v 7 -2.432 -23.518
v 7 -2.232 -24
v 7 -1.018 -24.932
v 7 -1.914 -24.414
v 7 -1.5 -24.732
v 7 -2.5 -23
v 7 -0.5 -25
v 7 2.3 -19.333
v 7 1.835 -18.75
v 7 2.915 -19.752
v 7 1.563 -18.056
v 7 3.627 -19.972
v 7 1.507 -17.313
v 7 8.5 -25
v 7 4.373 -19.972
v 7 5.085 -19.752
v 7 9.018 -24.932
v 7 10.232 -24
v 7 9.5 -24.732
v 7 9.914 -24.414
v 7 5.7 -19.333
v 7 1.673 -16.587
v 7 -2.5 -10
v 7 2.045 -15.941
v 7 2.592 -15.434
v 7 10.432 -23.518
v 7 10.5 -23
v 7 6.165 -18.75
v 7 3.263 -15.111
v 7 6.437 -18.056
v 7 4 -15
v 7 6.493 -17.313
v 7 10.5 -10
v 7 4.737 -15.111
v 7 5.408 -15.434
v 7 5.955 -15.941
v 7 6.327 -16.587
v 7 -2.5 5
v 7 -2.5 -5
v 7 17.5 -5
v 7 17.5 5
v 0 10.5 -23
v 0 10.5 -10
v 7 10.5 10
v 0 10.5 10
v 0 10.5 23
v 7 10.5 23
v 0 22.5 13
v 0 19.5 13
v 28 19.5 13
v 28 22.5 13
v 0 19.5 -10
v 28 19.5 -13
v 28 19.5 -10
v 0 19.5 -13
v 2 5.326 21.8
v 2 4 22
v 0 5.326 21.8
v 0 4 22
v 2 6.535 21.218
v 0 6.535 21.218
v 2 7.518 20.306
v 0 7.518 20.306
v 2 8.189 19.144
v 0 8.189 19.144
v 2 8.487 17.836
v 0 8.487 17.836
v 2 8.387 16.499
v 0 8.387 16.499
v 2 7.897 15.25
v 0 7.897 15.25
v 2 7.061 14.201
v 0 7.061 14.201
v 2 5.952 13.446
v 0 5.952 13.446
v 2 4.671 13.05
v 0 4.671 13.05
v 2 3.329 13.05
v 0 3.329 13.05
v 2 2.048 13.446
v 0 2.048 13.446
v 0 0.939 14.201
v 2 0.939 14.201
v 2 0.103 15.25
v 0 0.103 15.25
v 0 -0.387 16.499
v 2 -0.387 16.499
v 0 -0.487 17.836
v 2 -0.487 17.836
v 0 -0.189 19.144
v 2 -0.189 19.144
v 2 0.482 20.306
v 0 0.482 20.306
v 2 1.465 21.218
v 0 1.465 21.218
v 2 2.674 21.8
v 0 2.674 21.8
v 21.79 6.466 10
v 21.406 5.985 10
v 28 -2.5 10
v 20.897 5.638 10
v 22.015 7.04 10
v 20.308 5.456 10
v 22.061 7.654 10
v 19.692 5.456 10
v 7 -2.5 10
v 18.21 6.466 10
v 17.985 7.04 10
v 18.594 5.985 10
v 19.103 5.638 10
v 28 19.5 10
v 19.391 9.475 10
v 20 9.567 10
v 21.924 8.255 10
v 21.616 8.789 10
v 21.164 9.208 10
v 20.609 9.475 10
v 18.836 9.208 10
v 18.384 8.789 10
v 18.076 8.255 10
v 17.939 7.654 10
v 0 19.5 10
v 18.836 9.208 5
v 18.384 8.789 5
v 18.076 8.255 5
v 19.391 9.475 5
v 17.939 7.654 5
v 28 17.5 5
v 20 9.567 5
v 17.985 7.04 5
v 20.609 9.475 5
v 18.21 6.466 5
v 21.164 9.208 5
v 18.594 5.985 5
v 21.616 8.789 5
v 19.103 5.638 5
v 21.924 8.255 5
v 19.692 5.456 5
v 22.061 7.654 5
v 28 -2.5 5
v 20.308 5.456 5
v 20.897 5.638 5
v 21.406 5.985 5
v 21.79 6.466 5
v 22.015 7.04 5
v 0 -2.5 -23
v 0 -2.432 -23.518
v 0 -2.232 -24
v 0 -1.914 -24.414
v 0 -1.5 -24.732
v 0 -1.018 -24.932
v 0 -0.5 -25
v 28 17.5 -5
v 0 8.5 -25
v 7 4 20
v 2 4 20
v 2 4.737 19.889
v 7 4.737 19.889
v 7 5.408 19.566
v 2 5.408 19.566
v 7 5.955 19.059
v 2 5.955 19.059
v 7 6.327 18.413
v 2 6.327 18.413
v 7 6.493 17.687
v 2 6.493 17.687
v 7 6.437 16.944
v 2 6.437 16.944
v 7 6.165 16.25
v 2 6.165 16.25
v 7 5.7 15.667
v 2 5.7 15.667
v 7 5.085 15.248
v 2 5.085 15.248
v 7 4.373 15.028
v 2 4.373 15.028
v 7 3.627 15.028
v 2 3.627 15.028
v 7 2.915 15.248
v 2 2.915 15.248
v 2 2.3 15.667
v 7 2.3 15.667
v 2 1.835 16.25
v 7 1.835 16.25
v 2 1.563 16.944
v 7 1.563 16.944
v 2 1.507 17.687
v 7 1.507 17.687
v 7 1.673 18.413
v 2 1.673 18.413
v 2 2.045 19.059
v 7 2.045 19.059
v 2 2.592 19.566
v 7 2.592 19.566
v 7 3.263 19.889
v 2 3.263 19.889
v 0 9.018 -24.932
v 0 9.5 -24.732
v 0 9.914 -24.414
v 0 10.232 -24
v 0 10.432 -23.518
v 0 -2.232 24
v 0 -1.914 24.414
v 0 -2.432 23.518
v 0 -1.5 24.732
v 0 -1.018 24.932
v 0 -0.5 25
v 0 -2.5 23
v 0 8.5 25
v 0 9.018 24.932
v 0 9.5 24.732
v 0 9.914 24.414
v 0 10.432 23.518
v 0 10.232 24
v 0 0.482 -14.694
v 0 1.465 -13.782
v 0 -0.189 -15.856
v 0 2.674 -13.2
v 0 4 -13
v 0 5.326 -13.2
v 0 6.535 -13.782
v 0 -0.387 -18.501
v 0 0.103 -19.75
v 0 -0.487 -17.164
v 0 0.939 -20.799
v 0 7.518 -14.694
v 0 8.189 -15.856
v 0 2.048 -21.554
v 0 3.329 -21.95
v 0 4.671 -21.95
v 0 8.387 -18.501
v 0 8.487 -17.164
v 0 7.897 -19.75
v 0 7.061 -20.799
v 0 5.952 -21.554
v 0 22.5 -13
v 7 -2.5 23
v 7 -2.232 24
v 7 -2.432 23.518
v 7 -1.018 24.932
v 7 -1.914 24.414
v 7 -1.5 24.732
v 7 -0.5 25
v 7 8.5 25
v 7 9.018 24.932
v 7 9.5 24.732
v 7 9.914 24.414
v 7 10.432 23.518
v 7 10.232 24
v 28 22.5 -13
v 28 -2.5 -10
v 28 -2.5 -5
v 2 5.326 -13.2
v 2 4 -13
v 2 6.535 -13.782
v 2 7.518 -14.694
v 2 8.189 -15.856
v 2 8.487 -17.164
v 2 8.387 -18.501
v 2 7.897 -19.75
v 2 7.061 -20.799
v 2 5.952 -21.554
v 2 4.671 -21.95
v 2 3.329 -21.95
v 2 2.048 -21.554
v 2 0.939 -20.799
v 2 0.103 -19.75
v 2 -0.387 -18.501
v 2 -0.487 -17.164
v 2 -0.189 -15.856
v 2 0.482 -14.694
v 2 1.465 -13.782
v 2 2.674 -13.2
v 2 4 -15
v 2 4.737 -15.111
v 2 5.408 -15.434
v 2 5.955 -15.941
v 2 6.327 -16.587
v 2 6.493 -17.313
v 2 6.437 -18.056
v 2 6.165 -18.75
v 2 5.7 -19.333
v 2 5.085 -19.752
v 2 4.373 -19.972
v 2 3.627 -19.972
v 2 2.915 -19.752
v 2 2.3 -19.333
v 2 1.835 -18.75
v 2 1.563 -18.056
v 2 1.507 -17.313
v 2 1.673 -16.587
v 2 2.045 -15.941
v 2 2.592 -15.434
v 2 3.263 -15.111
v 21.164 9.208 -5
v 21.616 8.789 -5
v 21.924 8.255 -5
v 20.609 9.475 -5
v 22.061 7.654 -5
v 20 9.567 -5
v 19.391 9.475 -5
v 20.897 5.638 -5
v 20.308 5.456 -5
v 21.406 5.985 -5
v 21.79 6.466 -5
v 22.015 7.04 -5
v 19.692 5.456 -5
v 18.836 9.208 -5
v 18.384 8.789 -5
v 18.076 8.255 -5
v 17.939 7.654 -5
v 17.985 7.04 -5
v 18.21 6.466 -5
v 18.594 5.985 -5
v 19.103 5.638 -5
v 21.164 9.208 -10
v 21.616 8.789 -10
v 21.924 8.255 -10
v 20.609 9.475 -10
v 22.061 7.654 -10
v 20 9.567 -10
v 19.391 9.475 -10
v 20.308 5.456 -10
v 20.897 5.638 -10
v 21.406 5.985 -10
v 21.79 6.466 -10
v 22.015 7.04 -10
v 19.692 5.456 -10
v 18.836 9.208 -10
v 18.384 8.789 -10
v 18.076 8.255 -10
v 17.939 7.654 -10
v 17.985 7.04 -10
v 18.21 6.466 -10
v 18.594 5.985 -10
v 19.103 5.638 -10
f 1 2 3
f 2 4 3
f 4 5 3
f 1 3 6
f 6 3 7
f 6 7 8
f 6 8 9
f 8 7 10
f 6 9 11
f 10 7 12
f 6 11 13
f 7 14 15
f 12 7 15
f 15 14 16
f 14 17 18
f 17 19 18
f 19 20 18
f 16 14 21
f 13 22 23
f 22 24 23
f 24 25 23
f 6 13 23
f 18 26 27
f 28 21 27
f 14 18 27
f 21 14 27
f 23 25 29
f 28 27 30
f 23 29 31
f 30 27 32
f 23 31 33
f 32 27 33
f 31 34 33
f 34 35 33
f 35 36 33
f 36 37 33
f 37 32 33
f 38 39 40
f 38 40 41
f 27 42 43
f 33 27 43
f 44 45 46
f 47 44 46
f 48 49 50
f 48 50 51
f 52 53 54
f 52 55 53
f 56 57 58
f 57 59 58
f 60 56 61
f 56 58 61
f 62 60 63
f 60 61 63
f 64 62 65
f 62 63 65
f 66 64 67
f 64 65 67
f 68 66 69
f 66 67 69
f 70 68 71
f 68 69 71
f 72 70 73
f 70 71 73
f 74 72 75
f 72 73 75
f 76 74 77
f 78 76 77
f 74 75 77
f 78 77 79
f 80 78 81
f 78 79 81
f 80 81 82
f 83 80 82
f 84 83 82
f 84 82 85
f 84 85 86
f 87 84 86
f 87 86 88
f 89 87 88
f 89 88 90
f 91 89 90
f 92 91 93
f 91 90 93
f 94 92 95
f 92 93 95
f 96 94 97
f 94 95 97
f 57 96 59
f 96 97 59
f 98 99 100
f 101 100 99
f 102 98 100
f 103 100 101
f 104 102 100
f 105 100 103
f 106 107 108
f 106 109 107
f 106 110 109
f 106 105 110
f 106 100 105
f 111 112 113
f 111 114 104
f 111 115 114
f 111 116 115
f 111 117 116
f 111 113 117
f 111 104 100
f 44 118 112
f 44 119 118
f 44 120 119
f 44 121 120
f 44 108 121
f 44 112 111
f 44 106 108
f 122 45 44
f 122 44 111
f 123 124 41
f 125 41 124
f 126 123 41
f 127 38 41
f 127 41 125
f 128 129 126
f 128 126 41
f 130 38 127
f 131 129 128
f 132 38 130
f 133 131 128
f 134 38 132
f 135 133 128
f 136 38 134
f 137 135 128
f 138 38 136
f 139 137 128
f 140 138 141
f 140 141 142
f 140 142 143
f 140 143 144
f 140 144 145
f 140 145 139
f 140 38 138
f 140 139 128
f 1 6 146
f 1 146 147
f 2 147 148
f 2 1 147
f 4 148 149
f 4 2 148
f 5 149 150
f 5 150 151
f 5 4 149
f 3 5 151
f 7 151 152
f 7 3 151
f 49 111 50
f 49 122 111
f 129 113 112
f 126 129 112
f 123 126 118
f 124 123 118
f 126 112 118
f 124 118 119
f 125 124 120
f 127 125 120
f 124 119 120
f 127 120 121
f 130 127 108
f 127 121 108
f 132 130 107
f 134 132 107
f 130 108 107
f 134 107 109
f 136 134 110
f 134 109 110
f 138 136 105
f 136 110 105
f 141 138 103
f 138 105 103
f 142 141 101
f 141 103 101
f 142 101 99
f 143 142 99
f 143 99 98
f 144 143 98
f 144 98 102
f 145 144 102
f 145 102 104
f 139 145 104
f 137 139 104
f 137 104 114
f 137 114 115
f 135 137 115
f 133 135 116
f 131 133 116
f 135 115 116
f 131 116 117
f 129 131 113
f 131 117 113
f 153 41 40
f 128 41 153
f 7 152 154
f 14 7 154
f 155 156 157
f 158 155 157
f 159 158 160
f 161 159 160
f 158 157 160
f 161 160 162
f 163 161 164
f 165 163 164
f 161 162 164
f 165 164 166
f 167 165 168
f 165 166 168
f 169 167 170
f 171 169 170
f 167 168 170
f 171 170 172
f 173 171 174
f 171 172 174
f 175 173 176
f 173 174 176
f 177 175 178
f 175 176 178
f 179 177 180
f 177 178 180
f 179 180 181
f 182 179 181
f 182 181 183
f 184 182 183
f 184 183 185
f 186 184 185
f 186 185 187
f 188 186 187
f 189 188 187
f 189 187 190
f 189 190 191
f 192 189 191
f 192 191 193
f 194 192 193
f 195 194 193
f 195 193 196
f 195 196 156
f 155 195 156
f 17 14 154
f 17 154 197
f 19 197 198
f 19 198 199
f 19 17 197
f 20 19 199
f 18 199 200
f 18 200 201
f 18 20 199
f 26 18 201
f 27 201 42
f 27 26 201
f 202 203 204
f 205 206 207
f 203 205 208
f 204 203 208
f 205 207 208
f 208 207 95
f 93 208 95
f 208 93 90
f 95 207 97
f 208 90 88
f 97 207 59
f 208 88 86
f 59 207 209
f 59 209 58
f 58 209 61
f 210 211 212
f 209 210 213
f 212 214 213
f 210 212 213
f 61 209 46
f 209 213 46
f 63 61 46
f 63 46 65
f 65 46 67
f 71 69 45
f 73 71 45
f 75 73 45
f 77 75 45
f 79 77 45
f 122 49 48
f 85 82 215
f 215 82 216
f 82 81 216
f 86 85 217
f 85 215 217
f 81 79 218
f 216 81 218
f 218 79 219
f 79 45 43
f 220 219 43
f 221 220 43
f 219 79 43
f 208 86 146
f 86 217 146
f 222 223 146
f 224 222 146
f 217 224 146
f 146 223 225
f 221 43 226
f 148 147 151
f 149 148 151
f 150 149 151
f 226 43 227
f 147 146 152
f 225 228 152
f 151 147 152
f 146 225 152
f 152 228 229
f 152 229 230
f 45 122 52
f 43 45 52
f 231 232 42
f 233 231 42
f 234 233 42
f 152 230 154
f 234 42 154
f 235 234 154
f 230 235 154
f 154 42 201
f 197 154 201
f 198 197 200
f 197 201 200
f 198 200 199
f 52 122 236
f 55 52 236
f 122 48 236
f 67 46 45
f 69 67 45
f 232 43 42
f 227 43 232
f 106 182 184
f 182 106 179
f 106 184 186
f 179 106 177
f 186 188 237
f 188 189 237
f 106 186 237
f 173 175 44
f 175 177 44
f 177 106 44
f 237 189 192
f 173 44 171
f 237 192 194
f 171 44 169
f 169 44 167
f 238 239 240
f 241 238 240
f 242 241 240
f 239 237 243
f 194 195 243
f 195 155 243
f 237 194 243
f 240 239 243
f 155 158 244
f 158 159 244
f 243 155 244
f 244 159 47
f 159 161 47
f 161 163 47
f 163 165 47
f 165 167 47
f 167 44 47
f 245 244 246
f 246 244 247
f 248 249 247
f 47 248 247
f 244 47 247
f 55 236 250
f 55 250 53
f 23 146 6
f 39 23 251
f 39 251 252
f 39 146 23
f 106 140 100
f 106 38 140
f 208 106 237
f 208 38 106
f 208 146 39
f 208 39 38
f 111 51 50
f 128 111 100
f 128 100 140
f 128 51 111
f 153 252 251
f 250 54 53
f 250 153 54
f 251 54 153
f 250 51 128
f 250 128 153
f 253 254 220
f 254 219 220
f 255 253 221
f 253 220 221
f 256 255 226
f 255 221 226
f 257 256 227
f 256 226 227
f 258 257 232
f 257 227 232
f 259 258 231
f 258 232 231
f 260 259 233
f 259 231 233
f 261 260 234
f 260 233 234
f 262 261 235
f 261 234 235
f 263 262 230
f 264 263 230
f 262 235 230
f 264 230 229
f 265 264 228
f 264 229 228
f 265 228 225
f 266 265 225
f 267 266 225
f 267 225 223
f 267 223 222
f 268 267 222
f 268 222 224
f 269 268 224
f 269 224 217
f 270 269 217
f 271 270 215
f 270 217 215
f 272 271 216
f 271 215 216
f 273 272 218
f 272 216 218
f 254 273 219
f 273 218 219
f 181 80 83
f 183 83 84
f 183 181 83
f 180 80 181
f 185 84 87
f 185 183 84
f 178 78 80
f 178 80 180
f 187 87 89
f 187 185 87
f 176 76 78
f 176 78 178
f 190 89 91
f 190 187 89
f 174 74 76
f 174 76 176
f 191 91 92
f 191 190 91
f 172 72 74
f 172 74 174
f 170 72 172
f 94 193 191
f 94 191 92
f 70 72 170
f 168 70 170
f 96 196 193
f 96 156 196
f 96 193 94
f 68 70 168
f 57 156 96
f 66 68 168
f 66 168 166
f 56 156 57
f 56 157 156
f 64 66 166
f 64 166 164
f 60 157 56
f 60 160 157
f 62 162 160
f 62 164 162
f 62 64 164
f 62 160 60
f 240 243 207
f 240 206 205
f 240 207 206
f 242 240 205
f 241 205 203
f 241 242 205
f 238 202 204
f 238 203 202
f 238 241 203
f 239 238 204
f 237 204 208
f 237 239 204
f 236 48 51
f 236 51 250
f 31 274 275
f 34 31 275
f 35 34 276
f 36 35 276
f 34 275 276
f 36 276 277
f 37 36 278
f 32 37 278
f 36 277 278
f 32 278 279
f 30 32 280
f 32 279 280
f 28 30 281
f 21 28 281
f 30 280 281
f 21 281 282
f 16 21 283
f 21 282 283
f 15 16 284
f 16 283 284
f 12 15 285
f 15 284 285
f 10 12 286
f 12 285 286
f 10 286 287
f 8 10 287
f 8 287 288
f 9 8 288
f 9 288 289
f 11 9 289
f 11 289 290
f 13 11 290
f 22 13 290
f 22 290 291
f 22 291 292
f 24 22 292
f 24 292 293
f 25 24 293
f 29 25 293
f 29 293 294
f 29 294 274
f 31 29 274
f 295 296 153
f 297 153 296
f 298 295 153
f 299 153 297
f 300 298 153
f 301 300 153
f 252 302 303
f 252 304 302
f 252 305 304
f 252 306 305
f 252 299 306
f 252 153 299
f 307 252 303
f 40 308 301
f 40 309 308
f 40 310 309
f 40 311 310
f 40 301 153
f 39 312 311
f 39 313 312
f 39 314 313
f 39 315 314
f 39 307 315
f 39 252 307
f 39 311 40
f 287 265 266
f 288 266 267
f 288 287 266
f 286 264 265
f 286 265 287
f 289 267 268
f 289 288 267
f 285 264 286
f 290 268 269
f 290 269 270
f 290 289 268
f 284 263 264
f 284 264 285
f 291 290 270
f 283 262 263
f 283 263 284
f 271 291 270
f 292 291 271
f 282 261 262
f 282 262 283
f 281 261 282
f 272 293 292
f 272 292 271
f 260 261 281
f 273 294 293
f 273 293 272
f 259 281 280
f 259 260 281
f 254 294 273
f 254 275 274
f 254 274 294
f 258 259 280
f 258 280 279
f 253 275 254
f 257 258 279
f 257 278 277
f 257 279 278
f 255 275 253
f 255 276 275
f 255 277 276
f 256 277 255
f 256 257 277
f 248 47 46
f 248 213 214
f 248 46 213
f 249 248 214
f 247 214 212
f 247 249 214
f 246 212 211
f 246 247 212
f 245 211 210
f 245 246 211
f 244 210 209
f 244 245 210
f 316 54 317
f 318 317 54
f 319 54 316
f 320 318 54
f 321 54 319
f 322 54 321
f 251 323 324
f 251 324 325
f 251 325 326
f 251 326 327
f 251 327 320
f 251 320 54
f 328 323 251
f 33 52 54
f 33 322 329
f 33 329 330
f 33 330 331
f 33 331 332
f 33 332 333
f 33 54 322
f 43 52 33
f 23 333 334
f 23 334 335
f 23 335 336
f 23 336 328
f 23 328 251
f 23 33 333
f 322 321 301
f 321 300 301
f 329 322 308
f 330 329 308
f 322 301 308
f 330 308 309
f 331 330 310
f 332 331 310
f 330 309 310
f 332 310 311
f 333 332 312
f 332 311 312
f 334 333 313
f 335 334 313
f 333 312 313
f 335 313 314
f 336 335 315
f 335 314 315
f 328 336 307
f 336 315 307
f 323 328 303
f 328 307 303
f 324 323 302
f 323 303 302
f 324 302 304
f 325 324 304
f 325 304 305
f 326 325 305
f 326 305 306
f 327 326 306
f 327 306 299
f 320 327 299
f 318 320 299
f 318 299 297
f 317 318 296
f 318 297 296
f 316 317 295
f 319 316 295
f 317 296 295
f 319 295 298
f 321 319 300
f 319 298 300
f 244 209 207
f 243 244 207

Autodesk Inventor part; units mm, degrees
ref_plane "YZ Plane" through (0, 0, 0) normal (1, 0, 0) x (0, 1, 0)
ref_plane "XZ Plane" through (0, 0, 0) normal (0, 1, 0) x (-1, 0, 0)
ref_plane "XY Plane" through (0, 0, 0) normal (0, 0, 1) x (1, 0, 0)
sketch "Sketch7" plane through (0, 0, 0) normal (1, 0, 0) x (0, 0, -1)
  line L0 (10, -2.5) -> (-10, -2.5)
  line L1 (-10, -2.5) -> (-10, 22.5)
  line L2 (-10, 22.5) -> (10, 22.5)
  line L3 (10, 22.5) -> (10, -2.5)
  line L4 (13, 19.5) -> (10, 19.5)
  line L5 (10, 19.5) -> (10, 22.5)
  line L6 (10, 22.5) -> (13, 22.5)
  line L7 (13, 22.5) -> (13, 19.5)
  line L8 (-10, 19.5) -> (-13, 19.5)
  line L9 (-13, 19.5) -> (-13, 22.5)
  line L10 (-13, 22.5) -> (-10, 22.5)
  line L11 (-10, 22.5) -> (-10, 19.5)
  point P0 (0, -2.5)
  point P1 (0, 22.5)
  dimension "d26" = 20
  dimension "d27" = 25
  dimension "d30" = 3
  dimension "d31" = 3
  dimension "d32" = 3
  dimension "d33" = 3
  dimension "d72" = 0
extrude "Extrusion4" add sketch "Sketch7" along normal blind 28
sketch "Sketch15" plane through (0, -2.5, -10) normal (0, 0, -1) x (-1, 0, 0)
  line L0 (0, 0) -> (-28, 0) projected
  line L1 (-28, 0) -> (-28, 22) projected
  point P0 (0, 2.5)
  point P1 (-20, 10)
  dimension "d78" = 8
  dimension "d98" = 10
sketch "Sketch14" plane through (0, -2.5, -10) normal (0, -1, 0) x (1, 0, 0)
  line L0 (7, 15) -> (28, 15)
  line L1 (28, 15) -> (28, 5)
  line L2 (28, 5) -> (7, 5)
  line L3 (7, 5) -> (7, 15)
  line L4 (28, 20) -> (28, 0) projected
  point P0 (0, 10)
  point P1 (28, 10)
  point P2 (28, 10)
  dimension "d73" = 10
  dimension "d74" = 21
extrude "Extrusion8" cut sketch "Sketch14" against normal blind 20
hole "Hole6" at (20, 7.5, -10) direction (0, 0, 1) diameter 4.134 end through all thread size "M5x0.8" class "6H" standard "ISO Metric profile"
sketch "Sketch16" plane through (0, 0, 0) normal (-1, 0, 0) x (0, 0, 1)
  line L0 (25, -2.5) -> (-25, -2.5)
  line L1 (-25, -2.5) -> (-25, 10.5)
  line L2 (-25, 10.5) -> (25, 10.5)
  line L3 (25, 10.5) -> (25, -2.5)
  line L4 (10, -2.5) -> (-10, -2.5) projected
  line L5 (-10, -2.5) -> (-10, 19.5) projected
  line L6 (10, 19.5) -> (10, -2.5) projected
  circle A0 centre (17.5, 4) radius 2.5
  circle A1 centre (-17.5, 4) radius 2.5
  point P0 (0, 0)
  point P1 (25, 4)
  point P2 (-10, -2.5)
  point P3 (-10, 10.5)
  point P4 (10, 10.5)
  point P5 (10, -2.5)
  dimension "d86" = 15
  dimension "d88" = 15
  dimension "d89" = 13
  dimension "d90" = 5
  dimension "d91" = 7.5
  dimension "d92" = 7.5
extrude "Extrusion9" add sketch "Sketch16" against normal blind 7 contours L0 L6 L2 L3 | L0 L1 L2 L5
fillet "Fillet1" radius 2 4 edges at (3.5, -2.5, -25) (3.5, 10.5, -25) (3.5, -2.5, 25) (3.5, 10.5, 25)
sketch "Sketch17" plane through (0, 0, 0) normal (-1, 0, 0) x (0, 0, 1)
  circle A0 centre (17.5, 4) radius 4.5
  circle A1 centre (-17.5, 4) radius 4.5
  circle A2 centre (-17.5, 4) radius 2.5 projected
  circle A3 centre (17.5, 4) radius 2.5 projected
  point P0 (0, 0)
  dimension "d99" = 9
extrude "Extrusion10" cut sketch "Sketch17" against normal blind 2
equation "\"d88\" = d86"
equation "\"d91\" = 0.5 * d88"
equation "\"d92\" = d91"
properties part number "10-03-025"
